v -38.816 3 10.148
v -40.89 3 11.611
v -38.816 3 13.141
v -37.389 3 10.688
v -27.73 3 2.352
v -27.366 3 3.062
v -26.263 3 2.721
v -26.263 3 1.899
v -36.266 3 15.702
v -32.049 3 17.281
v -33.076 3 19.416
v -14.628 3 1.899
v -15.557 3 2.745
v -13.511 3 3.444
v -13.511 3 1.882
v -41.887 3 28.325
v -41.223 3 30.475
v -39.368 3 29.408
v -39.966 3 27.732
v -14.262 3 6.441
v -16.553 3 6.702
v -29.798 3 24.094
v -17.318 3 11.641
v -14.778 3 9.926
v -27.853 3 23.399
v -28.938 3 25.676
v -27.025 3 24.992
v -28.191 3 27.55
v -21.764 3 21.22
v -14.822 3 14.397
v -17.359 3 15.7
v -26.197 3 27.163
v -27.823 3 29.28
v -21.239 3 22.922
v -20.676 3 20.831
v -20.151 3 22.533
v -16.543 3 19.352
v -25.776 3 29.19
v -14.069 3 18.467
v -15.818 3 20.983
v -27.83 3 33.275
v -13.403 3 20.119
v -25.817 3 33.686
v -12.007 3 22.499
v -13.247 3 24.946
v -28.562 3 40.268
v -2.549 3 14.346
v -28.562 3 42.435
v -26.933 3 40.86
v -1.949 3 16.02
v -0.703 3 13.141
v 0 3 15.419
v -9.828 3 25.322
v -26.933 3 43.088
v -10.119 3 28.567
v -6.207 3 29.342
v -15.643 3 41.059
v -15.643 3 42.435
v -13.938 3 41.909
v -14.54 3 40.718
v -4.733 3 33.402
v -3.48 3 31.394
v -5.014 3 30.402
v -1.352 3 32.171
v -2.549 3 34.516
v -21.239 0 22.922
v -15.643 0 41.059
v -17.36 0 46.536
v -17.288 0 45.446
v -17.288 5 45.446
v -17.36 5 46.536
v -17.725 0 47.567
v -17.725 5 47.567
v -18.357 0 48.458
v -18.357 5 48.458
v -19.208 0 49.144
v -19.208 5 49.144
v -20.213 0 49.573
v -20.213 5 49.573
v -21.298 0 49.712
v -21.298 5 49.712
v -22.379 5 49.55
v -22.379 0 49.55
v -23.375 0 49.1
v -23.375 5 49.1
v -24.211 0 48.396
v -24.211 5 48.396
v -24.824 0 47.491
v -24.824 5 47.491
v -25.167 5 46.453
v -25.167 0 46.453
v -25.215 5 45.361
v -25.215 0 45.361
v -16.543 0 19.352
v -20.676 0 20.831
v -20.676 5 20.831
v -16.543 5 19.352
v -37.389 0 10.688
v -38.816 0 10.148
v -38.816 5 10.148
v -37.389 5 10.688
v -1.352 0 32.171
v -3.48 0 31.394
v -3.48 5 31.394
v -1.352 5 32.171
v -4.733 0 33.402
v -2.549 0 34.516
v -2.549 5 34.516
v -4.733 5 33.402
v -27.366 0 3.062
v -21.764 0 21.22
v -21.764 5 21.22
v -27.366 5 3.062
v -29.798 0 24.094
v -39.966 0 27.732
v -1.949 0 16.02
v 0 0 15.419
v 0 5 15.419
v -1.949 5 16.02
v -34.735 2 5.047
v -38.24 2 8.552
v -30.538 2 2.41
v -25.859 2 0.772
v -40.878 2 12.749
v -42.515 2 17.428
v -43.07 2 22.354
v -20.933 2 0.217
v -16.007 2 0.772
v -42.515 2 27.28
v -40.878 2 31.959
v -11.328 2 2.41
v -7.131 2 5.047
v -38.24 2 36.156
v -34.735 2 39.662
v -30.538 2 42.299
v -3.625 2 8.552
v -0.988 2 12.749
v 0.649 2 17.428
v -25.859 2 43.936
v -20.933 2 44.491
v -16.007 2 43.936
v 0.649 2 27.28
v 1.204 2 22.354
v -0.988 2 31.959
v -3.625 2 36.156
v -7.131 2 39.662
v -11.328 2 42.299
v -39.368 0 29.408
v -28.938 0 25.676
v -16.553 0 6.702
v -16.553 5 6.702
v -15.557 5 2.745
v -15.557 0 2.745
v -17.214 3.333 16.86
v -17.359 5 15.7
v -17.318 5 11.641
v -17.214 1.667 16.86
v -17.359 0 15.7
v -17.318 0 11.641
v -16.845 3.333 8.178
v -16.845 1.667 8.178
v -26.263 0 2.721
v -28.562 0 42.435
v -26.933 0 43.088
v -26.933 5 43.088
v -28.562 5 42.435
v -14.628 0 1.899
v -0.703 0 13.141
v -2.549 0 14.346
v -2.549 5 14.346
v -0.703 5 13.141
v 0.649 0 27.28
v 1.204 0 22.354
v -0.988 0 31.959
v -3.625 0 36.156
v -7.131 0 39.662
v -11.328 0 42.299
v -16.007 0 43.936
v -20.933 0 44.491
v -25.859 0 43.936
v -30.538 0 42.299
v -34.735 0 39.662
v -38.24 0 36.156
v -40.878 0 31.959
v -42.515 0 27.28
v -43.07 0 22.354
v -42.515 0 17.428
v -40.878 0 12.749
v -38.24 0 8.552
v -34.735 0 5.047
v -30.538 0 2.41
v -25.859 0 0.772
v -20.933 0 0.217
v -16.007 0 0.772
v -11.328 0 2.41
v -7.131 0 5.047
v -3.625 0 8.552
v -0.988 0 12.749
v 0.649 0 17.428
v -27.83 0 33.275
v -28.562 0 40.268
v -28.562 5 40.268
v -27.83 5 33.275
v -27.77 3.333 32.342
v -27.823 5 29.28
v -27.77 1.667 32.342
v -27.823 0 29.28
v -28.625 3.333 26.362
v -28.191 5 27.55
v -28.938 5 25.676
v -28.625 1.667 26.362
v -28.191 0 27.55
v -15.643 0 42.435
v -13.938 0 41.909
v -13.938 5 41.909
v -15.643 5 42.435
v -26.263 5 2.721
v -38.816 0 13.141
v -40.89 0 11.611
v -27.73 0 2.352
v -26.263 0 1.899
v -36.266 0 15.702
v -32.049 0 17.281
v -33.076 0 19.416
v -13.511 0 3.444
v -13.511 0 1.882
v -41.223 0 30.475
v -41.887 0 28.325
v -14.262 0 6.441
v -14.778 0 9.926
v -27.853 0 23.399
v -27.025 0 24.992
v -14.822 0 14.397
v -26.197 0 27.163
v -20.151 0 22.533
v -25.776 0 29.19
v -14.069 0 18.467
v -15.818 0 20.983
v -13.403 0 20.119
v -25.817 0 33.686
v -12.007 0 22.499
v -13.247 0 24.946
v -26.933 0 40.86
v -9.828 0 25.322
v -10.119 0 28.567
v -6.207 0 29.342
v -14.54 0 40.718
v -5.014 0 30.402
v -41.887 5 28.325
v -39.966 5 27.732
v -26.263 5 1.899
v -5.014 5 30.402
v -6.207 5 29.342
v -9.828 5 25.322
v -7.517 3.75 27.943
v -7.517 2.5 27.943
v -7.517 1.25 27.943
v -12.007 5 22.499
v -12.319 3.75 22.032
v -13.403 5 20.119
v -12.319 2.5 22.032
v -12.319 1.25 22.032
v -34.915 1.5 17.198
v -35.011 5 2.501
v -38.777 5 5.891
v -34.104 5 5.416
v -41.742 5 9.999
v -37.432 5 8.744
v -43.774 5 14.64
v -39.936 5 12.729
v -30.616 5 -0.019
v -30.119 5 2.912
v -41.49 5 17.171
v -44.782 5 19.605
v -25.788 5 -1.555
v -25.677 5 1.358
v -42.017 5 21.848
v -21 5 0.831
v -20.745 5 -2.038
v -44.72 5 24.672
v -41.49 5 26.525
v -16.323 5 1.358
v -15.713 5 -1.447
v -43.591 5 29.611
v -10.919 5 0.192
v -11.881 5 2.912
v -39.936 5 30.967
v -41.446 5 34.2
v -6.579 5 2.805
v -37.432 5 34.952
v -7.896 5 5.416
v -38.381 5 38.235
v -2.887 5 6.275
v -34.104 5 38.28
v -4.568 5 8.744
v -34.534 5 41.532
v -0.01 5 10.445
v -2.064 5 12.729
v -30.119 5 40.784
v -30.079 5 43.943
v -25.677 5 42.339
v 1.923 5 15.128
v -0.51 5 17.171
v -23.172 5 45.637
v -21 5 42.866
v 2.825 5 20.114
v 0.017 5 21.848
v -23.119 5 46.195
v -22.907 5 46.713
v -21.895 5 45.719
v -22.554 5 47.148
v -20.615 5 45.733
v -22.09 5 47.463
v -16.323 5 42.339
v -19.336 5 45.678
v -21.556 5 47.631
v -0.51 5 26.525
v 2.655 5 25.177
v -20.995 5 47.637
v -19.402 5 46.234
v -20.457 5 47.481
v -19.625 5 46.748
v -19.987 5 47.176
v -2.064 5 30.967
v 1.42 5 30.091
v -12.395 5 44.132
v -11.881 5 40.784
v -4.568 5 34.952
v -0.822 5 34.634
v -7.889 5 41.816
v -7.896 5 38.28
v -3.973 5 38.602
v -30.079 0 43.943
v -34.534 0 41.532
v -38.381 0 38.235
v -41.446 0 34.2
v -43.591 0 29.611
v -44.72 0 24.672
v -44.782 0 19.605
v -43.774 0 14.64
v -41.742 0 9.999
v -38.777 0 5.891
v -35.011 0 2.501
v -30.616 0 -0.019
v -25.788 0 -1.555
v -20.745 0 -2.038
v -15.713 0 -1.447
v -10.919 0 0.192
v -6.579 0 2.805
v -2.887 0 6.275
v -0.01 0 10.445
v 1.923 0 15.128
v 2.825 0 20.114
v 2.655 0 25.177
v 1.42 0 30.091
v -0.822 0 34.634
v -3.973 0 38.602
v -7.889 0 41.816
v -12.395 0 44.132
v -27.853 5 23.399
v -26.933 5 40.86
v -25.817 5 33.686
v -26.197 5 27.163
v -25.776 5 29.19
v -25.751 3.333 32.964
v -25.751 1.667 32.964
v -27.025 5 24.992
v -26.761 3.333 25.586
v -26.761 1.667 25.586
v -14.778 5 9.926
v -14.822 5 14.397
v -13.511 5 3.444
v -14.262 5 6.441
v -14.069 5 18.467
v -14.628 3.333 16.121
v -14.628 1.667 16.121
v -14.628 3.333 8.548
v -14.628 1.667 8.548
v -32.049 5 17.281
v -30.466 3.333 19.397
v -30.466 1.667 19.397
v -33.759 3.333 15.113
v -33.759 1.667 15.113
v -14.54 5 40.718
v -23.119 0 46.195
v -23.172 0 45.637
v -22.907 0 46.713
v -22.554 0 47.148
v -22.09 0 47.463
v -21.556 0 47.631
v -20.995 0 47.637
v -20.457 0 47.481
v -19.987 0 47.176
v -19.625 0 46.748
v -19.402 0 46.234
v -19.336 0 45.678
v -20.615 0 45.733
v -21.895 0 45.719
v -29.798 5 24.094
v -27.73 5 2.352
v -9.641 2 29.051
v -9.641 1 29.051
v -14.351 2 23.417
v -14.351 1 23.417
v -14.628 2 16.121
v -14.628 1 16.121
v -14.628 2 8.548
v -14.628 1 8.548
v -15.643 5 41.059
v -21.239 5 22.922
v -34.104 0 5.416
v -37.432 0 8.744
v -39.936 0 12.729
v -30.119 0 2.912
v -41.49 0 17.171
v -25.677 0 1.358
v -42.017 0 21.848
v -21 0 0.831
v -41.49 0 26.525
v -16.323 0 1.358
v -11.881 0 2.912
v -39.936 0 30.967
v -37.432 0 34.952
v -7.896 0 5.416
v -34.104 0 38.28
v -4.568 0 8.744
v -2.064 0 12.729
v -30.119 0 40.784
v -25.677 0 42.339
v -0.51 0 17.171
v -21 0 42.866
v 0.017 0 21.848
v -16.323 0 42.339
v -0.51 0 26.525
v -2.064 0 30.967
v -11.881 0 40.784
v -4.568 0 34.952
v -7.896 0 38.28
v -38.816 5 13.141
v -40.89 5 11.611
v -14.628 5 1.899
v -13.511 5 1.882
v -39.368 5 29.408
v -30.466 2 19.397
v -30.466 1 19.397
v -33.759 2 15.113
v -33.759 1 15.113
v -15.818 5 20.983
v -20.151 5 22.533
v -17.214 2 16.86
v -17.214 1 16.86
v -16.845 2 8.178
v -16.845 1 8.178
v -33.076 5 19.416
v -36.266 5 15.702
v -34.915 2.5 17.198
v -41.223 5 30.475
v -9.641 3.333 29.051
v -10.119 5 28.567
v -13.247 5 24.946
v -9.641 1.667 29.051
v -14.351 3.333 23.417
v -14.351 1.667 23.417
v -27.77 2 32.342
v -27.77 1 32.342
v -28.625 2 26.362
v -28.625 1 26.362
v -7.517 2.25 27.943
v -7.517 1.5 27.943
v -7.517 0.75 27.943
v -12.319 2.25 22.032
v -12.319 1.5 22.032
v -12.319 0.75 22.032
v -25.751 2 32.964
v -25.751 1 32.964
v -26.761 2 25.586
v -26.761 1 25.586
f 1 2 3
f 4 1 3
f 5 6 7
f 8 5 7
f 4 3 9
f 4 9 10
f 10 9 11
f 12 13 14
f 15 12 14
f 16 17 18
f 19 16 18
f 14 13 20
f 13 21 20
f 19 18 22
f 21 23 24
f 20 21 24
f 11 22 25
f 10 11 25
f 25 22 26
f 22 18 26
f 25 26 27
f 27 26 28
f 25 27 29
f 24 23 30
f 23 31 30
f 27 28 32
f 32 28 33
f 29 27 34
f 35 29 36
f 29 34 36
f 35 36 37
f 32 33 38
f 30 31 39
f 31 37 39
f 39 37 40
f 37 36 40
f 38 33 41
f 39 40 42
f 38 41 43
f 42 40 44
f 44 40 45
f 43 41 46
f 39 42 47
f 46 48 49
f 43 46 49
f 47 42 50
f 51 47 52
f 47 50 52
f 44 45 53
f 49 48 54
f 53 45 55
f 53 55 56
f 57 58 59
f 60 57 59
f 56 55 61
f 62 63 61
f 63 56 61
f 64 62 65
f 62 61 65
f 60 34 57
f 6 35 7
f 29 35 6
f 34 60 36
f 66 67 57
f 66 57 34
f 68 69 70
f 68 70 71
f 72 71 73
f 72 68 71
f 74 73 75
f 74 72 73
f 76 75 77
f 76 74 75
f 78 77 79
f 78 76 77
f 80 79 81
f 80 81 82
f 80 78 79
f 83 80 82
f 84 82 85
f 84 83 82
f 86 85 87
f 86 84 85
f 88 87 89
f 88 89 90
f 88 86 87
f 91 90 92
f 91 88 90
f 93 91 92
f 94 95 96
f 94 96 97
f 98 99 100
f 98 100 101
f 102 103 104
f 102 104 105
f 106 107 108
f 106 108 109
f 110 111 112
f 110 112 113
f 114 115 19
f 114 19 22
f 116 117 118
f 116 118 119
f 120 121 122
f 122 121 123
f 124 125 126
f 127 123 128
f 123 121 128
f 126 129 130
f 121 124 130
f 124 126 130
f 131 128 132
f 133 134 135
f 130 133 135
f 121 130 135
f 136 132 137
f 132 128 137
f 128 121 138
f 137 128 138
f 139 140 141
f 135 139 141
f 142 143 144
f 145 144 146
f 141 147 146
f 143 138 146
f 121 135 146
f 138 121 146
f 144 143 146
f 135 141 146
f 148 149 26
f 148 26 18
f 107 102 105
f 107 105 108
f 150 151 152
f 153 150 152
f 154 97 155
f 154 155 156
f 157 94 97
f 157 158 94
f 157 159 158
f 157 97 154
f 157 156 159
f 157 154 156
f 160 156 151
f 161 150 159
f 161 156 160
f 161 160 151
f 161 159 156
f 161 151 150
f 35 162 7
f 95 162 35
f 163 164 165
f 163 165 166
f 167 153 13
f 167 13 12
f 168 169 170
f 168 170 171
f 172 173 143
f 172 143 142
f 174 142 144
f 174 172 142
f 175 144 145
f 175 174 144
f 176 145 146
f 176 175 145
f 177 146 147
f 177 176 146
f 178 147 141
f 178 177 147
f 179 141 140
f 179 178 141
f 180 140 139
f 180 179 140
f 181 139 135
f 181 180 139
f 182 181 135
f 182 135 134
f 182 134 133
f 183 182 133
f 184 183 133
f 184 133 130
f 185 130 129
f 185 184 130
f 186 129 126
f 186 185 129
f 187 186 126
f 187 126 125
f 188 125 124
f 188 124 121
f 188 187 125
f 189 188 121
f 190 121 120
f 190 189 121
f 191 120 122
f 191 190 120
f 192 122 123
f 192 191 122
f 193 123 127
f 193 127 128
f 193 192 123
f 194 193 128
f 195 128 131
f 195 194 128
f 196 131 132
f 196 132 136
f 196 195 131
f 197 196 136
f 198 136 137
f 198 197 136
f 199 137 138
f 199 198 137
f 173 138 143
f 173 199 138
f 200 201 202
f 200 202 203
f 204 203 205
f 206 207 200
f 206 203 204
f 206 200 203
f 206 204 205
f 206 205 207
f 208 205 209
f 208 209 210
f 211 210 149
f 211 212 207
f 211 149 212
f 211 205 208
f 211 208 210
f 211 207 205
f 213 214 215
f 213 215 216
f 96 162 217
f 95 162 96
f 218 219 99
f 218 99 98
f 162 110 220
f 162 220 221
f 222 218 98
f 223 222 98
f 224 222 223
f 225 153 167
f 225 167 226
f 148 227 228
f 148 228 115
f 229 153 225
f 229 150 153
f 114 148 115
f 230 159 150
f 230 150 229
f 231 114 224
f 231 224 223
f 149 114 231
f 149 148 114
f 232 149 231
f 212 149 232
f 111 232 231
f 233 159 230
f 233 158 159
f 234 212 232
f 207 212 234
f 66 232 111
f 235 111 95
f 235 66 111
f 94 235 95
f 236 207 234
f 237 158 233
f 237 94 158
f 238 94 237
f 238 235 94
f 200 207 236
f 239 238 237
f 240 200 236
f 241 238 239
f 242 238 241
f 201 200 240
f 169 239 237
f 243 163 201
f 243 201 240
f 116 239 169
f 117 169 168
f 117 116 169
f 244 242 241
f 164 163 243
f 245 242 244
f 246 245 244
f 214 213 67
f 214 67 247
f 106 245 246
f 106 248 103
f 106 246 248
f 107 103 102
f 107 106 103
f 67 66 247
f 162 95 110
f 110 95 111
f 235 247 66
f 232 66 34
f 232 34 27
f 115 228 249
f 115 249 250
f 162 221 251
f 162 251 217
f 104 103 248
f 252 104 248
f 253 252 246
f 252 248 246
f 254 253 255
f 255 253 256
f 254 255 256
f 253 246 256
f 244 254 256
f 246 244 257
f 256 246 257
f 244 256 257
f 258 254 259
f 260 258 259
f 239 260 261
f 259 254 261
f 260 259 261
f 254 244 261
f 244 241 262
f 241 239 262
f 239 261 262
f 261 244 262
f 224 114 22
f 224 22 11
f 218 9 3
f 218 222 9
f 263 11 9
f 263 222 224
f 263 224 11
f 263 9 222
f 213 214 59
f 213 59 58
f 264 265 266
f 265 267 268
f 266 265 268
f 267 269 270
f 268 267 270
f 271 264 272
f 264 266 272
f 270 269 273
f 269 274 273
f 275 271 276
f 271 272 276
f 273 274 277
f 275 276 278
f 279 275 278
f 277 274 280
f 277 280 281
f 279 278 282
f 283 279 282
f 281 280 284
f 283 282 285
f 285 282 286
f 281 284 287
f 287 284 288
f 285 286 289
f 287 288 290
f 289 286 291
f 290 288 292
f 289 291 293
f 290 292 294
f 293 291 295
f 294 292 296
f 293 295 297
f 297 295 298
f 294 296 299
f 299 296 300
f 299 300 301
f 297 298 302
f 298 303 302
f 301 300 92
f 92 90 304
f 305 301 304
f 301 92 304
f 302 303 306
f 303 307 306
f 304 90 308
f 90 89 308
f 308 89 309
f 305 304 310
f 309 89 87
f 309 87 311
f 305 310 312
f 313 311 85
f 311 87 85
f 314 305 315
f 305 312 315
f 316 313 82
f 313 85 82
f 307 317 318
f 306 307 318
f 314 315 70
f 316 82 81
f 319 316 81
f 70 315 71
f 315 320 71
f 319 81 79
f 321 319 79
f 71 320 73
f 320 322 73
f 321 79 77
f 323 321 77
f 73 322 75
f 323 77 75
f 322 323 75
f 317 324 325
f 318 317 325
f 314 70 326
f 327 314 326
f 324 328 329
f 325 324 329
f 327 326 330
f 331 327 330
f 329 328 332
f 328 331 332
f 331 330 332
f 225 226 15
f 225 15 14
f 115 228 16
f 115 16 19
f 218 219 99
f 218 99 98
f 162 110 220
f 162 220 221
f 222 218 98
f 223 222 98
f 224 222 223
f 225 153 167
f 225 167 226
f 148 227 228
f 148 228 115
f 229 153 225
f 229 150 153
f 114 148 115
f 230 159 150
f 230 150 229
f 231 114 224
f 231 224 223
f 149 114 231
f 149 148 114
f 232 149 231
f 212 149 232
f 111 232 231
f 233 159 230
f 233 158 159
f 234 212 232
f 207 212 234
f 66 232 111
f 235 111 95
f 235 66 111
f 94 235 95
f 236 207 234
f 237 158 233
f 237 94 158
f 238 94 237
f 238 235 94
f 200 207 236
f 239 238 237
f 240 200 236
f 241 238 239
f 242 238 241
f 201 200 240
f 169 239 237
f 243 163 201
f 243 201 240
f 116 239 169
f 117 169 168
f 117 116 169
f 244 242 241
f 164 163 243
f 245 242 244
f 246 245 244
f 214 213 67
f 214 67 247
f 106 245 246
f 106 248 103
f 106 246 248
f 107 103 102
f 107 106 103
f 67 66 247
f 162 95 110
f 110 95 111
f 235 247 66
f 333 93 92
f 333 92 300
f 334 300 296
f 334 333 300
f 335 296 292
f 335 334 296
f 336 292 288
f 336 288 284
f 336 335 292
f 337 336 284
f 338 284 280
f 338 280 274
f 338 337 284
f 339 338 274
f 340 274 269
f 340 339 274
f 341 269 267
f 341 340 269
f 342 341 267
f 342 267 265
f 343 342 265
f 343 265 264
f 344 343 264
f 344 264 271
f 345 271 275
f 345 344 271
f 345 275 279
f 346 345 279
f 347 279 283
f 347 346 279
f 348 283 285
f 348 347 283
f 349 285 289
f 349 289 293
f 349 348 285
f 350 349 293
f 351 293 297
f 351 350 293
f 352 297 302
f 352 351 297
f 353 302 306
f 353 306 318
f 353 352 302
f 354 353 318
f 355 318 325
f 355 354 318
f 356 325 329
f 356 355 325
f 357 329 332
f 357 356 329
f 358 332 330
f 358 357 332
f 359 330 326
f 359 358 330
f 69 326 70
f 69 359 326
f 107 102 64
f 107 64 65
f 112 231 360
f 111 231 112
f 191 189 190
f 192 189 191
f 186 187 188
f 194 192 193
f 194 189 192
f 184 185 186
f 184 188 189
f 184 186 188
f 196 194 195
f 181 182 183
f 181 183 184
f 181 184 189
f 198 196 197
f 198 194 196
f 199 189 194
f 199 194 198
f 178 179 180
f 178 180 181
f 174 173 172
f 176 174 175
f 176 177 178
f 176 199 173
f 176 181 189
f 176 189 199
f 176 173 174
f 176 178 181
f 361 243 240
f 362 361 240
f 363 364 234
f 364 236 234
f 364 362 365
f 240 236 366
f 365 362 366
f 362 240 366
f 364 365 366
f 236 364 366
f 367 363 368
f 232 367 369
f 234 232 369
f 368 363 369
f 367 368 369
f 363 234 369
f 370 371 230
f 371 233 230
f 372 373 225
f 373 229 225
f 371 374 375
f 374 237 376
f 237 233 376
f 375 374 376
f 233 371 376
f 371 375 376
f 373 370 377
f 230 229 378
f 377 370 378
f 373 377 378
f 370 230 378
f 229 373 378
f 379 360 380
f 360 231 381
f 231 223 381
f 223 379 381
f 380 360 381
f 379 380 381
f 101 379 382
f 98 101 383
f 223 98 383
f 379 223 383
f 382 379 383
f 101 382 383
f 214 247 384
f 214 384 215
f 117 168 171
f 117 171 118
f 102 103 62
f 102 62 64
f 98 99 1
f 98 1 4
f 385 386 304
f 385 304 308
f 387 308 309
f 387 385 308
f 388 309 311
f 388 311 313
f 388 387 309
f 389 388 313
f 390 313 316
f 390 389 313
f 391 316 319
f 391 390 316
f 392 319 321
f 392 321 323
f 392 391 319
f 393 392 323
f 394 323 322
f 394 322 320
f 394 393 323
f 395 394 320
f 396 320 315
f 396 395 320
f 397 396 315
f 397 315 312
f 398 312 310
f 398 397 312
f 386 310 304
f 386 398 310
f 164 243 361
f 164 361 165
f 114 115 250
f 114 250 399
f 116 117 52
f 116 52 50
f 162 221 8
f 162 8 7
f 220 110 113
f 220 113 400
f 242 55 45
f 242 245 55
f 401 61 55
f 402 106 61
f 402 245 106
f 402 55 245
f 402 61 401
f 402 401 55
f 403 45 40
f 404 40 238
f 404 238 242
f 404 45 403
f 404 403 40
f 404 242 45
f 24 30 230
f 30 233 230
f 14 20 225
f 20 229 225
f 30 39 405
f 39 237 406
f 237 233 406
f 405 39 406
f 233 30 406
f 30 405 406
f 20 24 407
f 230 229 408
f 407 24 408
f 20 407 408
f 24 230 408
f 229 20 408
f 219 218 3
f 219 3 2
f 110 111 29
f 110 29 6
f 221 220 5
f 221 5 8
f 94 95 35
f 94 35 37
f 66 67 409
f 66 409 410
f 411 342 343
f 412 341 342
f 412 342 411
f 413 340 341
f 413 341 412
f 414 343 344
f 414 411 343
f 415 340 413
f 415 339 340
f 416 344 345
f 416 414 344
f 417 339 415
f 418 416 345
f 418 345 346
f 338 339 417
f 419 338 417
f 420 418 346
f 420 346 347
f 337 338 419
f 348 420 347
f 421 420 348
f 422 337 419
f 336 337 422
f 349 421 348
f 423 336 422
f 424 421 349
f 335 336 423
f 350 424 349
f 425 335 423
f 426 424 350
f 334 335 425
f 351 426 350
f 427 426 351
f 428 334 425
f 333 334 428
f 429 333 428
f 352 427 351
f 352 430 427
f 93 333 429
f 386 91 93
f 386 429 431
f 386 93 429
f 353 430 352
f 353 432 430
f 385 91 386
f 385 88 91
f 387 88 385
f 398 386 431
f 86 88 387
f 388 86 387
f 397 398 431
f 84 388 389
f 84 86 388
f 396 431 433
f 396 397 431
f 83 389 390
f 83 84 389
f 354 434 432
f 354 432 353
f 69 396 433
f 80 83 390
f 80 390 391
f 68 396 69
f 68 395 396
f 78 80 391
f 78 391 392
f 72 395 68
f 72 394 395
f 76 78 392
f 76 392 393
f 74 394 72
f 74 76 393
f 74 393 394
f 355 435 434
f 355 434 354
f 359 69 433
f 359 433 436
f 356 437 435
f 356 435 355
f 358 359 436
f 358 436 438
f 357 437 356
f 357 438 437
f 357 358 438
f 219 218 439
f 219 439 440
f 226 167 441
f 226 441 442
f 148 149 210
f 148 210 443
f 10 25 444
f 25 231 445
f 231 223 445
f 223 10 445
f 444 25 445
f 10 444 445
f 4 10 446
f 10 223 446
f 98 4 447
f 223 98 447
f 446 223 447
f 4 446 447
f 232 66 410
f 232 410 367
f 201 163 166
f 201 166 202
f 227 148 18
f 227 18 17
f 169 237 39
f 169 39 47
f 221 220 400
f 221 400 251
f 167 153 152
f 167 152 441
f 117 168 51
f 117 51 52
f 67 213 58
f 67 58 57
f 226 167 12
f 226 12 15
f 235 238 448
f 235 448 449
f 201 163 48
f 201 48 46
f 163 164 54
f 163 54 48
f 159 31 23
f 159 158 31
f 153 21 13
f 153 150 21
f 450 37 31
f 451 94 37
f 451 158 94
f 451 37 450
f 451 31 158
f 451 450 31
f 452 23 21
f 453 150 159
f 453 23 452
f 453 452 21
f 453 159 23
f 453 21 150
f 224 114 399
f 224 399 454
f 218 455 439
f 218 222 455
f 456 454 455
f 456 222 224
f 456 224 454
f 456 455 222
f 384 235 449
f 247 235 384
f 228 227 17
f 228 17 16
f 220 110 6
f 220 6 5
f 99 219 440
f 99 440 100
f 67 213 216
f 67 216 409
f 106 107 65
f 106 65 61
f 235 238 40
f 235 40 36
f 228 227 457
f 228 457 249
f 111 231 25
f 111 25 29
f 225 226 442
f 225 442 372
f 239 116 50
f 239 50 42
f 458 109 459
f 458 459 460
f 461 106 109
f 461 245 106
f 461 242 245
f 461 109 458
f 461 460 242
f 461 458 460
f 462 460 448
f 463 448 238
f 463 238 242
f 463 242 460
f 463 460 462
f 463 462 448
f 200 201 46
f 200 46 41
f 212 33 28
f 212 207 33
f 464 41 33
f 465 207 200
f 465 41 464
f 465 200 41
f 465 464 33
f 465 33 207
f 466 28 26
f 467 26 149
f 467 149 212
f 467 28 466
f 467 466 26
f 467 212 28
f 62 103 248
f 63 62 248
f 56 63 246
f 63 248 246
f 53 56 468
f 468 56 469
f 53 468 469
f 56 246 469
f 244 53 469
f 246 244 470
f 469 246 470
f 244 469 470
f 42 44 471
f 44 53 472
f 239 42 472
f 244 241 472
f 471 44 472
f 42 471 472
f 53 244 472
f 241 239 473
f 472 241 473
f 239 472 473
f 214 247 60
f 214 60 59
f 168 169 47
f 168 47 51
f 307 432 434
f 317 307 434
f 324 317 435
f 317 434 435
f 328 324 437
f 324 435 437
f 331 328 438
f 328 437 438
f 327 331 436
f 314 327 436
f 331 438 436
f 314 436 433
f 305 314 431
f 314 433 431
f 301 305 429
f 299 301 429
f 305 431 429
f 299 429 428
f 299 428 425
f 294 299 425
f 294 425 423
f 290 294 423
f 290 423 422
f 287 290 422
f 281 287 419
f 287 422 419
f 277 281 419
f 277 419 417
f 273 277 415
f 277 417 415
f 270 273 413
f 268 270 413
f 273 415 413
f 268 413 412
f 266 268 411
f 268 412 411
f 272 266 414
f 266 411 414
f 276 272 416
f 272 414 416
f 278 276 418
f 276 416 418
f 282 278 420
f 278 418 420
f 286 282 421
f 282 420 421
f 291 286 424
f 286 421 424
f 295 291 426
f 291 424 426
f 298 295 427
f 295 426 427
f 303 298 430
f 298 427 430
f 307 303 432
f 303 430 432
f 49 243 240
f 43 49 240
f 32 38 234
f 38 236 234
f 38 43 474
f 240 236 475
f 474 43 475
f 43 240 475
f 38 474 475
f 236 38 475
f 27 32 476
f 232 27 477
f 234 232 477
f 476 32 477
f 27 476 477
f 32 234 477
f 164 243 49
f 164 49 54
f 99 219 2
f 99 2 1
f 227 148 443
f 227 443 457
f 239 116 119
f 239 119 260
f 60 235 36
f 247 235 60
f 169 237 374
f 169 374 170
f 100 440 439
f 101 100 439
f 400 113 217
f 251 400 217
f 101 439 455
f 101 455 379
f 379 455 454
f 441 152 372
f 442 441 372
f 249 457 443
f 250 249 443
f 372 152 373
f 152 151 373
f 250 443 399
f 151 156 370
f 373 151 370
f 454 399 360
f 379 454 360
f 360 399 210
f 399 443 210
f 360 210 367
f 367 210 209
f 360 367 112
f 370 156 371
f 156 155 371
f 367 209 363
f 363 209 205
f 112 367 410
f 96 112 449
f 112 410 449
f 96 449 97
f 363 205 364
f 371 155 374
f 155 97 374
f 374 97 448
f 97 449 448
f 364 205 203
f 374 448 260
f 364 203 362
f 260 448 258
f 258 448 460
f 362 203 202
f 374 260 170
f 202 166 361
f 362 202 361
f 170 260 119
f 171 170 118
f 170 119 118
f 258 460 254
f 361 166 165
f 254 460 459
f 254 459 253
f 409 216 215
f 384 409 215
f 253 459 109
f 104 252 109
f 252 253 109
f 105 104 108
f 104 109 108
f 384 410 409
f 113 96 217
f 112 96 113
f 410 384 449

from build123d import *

# Parameters (mm, degrees)
F0_R     = 21.0173694248
F2_DEPTH = 5
F3_DEPTH = 3
F4_R     = 22.1369694457
F5_DEPTH = 2


with BuildPart() as f2:
    # F0 (on Front) → F2 (new body)
    with BuildSketch(Plane.XZ):
        with BuildLine():
            ThreePointArc((-25.2147613693, 45.3611427927), (-20.7448855599, -2.0381687537), (-17.2883954881, 45.4457990798))
            ThreePointArc((-17.2883954881, 45.4457990798), (-21.2975900226, 49.7115352336), (-25.2147613693, 45.3611427927))
        make_face()
        with Locations((-21, 21.848189415)):
            Circle(F0_R, mode=Mode.SUBTRACT)
        with BuildLine():
            ThreePointArc((-23.1723608778, 45.6369270477), (-21.2756166421, 47.6541682056), (-19.3362203485, 45.677898335))
            ThreePointArc((-19.3362203485, 45.677898335), (-21.2551144401, 45.7345475837), (-23.1723608778, 45.6369270477))
        make_face(mode=Mode.SUBTRACT)
    extrude(amount=-F2_DEPTH)


with BuildPart() as f2b:
    # F1 (on face) → F2, piece 2 (new body)
    with BuildSketch(Plane.XZ):
        with BuildLine():
            Line((-15.6434053378, 42.4352623522), (-15.6434053378, 41.0586307483))
            Line((-15.6434053378, 41.0586307483), (-21.2389320528, 22.9218076049))
            Line((-21.2389320528, 22.9218076049), (-27.0251246129, 24.9918799515))
            add(Edge.make_bspline(
                [(-27.0251246129, 24.9918799515), (-27.2667200019, 24.4750783506), (-27.5440850694, 23.9433288862), (-27.8527339783, 23.398512914)],
                knots=[0.5850241897, 0.5850241897, 0.5850241897, 0.5850241897, 0.6369170232, 0.6369170232, 0.6369170232, 0.6369170232], degree=3))
            Line((-27.8527339783, 23.398512914), (-21.7639160209, 21.220173091))
            Line((-21.7639160209, 21.220173091), (-27.3661202396, 3.0617061044))
            Line((-27.3661202396, 3.0617061044), (-27.7301800651, 2.3515297653))
            Line((-27.7301800651, 2.3515297653), (-26.2630893095, 1.8989066432))
            Line((-26.2630893095, 1.8989066432), (-26.2630893095, 2.7214017971))
            Line((-26.2630893095, 2.7214017971), (-20.675977002, 20.8309512574))
            Line((-20.675977002, 20.8309512574), (-16.5428058438, 19.3522650178))
            add(Edge.make_bspline(
                [(-15.8184717487, 20.9825798891), (-16.0888028731, 20.4550204602), (-16.3323949207, 19.9134852447), (-16.5428058438, 19.3522650178)],
                knots=[0.4780011516, 0.4780011516, 0.4780011516, 0.4780011516, 0.5285364589, 0.5285364589, 0.5285364589, 0.5285364589], degree=3))
            Line((-15.8184717487, 20.9825798891), (-20.150993034, 22.5325857713))
            Line((-20.150993034, 22.5325857713), (-14.5403744077, 40.7183264409))
            Line((-14.5403744077, 40.7183264409), (-13.9376726897, 41.9090140382))
            Line((-13.9376726897, 41.9090140382), (-15.6434053378, 42.4352623522))
        make_face()
        with BuildLine():
            add(Edge.make_bspline(
                [(-27.0251246129, 24.9918799515), (-27.2667200019, 24.4750783506), (-27.5440850694, 23.9433288862), (-27.8527339783, 23.398512914)],
                knots=[0.5850241897, 0.5850241897, 0.5850241897, 0.5850241897, 0.6369170232, 0.6369170232, 0.6369170232, 0.6369170232], degree=3))
            add(Edge.make_bspline(
                [(-26.9327240246, 40.8604158787), (-26.4461932855, 38.1720542595), (-25.4831391669, 32.8703496623), (-25.6253116841, 28.1230420347), (-26.9315363662, 25.1920764699), (-27.0251246129, 24.9918799515)],
                knots=[0, 0, 0, 0, 0.2873866411, 0.5649221532, 0.5850241897, 0.5850241897, 0.5850241897, 0.5850241897], degree=3))
            Line((-26.9327240246, 40.8604158787), (-26.9327240246, 43.088324368))
            Line((-26.9327240246, 43.088324368), (-28.561863665, 42.4352623522))
            Line((-28.561863665, 42.4352623522), (-28.561863665, 40.267697307))
            add(Edge.make_bspline(
                [(-28.561863665, 40.267697307), (-28.2332233479, 37.4932257691), (-27.6084806879, 32.2857996771), (-27.7056505928, 28.3536086922), (-28.8248751971, 25.9088704148), (-28.93806897, 25.676256279)],
                knots=[0, 0, 0, 0, 0.2568823312, 0.4805952008, 0.5037124373, 0.5037124373, 0.5037124373, 0.5037124373], degree=3))
            add(Edge.make_bspline(
                [(-28.93806897, 25.676256279), (-29.1875918662, 25.1634846718), (-29.4777928646, 24.6329834512), (-29.7976547361, 24.0943291412)],
                knots=[0.5037124373, 0.5037124373, 0.5037124373, 0.5037124373, 0.5546717761, 0.5546717761, 0.5546717761, 0.5546717761], degree=3))
            add(Edge.make_bspline(
                [(-29.7976547361, 24.0943291412), (-31.2374923714, 21.6696114203), (-35.1995176822, 16.6416461958), (-37.6393346001, 14.2831347624), (-38.816240489, 13.1410918814)],
                knots=[0.5546717761, 0.5546717761, 0.5546717761, 0.5546717761, 0.7840619611, 1, 1, 1, 1], degree=3))
            Line((-38.816240489, 13.1410918814), (-40.8904254436, 11.6106858477))
            Line((-40.8904254436, 11.6106858477), (-38.816240489, 10.1480129416))
            Line((-38.816240489, 10.1480129416), (-37.3893617116, 10.6880366863))
            add(Edge.make_bspline(
                [(-27.8527339783, 23.398512914), (-30.0122838985, 19.5865529315), (-33.7033340895, 15.1349221345), (-37.3893617116, 10.6880366863)],
                knots=[0.6369170232, 0.6369170232, 0.6369170232, 0.6369170232, 1, 1, 1, 1], degree=3))
        make_face()
        with BuildLine():
            add(Edge.make_bspline(
                [(-4.7326299883, 33.4018265599), (-6.3838063491, 32.0250727471), (-9.7867688662, 29.1885817162), (-13.6252095004, 24.6696939229), (-15.3884484127, 21.8217835363), (-15.8184717487, 20.9825798891)],
                knots=[0, 0, 0, 0, 0.1931958421, 0.3976132144, 0.4780011516, 0.4780011516, 0.4780011516, 0.4780011516], degree=3))
            add(Edge.make_bspline(
                [(-15.8184717487, 20.9825798891), (-16.0888028731, 20.4550204602), (-16.3323949207, 19.9134852447), (-16.5428058438, 19.3522650178)],
                knots=[0.4780011516, 0.4780011516, 0.4780011516, 0.4780011516, 0.5285364589, 0.5285364589, 0.5285364589, 0.5285364589], degree=3))
            add(Edge.make_bspline(
                [(-16.5428058438, 19.3522650178), (-16.8378280623, 18.5653646327), (-17.7887482068, 15.1488505296), (-17.0326071228, 8.1565953069), (-16.0108322366, 4.4090669931), (-15.5574461885, 2.745420875)],
                knots=[0.5285364589, 0.5285364589, 0.5285364589, 0.5285364589, 0.5993932294, 0.8217572748, 1, 1, 1, 1], degree=3))
            Line((-15.5574461885, 2.745420875), (-14.6284196526, 1.8989066432))
            Line((-14.6284196526, 1.8989066432), (-13.510598544, 1.8815415679))
            Line((-13.510598544, 1.8815415679), (-13.510598544, 3.4444969801))
            add(Edge.make_bspline(
                [(-14.069044194, 18.4672502987), (-14.3144930834, 17.7220644749), (-15.0270887125, 14.7189198371), (-14.8879048078, 8.5169626468), (-13.9376726897, 5.0225594813), (-13.510598544, 3.4444969801)],
                knots=[0.5582363622, 0.5582363622, 0.5582363622, 0.5582363622, 0.6285679089, 0.8314758152, 1, 1, 1, 1], degree=3))
            add(Edge.make_bspline(
                [(-13.4034524292, 20.1185808677), (-13.6632532189, 19.5761416352), (-13.8838117808, 19.029618166), (-14.069044194, 18.4672502987)],
                knots=[0.5051593971, 0.5051593971, 0.5051593971, 0.5051593971, 0.5582363622, 0.5582363622, 0.5582363622, 0.5582363622], degree=3))
            add(Edge.make_bspline(
                [(-3.4803220268, 31.3940724804), (-4.0596052372, 31.048753856), (-5.3792648724, 30.2642054545), (-7.6161489545, 27.8563879413), (-11.5665036402, 23.4480832146), (-13.0983628201, 20.7555788294), (-13.4034524292, 20.1185808677)],
                knots=[0, 0, 0, 0, 0.1061157447, 0.2393511298, 0.4428299848, 0.5051593971, 0.5051593971, 0.5051593971, 0.5051593971], degree=3))
            Line((-3.4803220268, 31.3940724804), (-1.3515079001, 32.1705370468))
            Line((-1.3515079001, 32.1705370468), (-2.5490200479, 34.5164759679))
            Line((-2.5490200479, 34.5164759679), (-4.7326299883, 33.4018265599))
        make_face()
        with BuildLine():
            add(Edge.make_bspline(
                [(-28.93806897, 25.676256279), (-29.1875918662, 25.1634846718), (-29.4777928646, 24.6329834512), (-29.7976547361, 24.0943291412)],
                knots=[0.5037124373, 0.5037124373, 0.5037124373, 0.5037124373, 0.5546717761, 0.5546717761, 0.5546717761, 0.5546717761], degree=3))
            Line((-28.93806897, 25.676256279), (-39.3682815074, 29.4077765003))
            Line((-39.3682815074, 29.4077765003), (-41.2232555875, 30.4750070098))
            Line((-41.2232555875, 30.4750070098), (-41.886651929, 28.3247354211))
            Line((-41.886651929, 28.3247354211), (-39.9663495654, 27.7322886022))
            Line((-39.9663495654, 27.7322886022), (-29.7976547361, 24.0943291412))
        make_face()
        with BuildLine():
            Line((-1.948548289, 16.0204662531), (-13.4034524292, 20.1185808677))
            add(Edge.make_bspline(
                [(-13.4034524292, 20.1185808677), (-13.6632532189, 19.5761416352), (-13.8838117808, 19.029618166), (-14.069044194, 18.4672502987)],
                knots=[0.5051593971, 0.5051593971, 0.5051593971, 0.5051593971, 0.5582363622, 0.5582363622, 0.5582363622, 0.5582363622], degree=3))
            Line((-14.069044194, 18.4672502987), (-2.5490200479, 14.3458383047))
            Line((-2.5490200479, 14.3458383047), (-0.7028685605, 13.1410918814))
            Line((-0.7028685605, 13.1410918814), (0, 15.4193050729))
            Line((0, 15.4193050729), (-1.948548289, 16.0204662531))
        make_face()
    extrude(amount=-F2_DEPTH)


with BuildPart() as f3:
    # F1 (on face) → F3 (new body)
    with BuildSketch(Plane.XZ):
        with BuildLine():
            Line((-15.6434053378, 42.4352623522), (-15.6434053378, 41.0586307483))
            Line((-15.6434053378, 41.0586307483), (-21.2389320528, 22.9218076049))
            Line((-21.2389320528, 22.9218076049), (-27.0251246129, 24.9918799515))
            add(Edge.make_bspline(
                [(-27.0251246129, 24.9918799515), (-27.2667200019, 24.4750783506), (-27.5440850694, 23.9433288862), (-27.8527339783, 23.398512914)],
                knots=[0.5850241897, 0.5850241897, 0.5850241897, 0.5850241897, 0.6369170232, 0.6369170232, 0.6369170232, 0.6369170232], degree=3))
            Line((-27.8527339783, 23.398512914), (-21.7639160209, 21.220173091))
            Line((-21.7639160209, 21.220173091), (-27.3661202396, 3.0617061044))
            Line((-27.3661202396, 3.0617061044), (-27.7301800651, 2.3515297653))
            Line((-27.7301800651, 2.3515297653), (-26.2630893095, 1.8989066432))
            Line((-26.2630893095, 1.8989066432), (-26.2630893095, 2.7214017971))
            Line((-26.2630893095, 2.7214017971), (-20.675977002, 20.8309512574))
            Line((-20.675977002, 20.8309512574), (-16.5428058438, 19.3522650178))
            add(Edge.make_bspline(
                [(-15.8184717487, 20.9825798891), (-16.0888028731, 20.4550204602), (-16.3323949207, 19.9134852447), (-16.5428058438, 19.3522650178)],
                knots=[0.4780011516, 0.4780011516, 0.4780011516, 0.4780011516, 0.5285364589, 0.5285364589, 0.5285364589, 0.5285364589], degree=3))
            Line((-15.8184717487, 20.9825798891), (-20.150993034, 22.5325857713))
            Line((-20.150993034, 22.5325857713), (-14.5403744077, 40.7183264409))
            Line((-14.5403744077, 40.7183264409), (-13.9376726897, 41.9090140382))
            Line((-13.9376726897, 41.9090140382), (-15.6434053378, 42.4352623522))
        make_face()
        with BuildLine():
            add(Edge.make_bspline(
                [(-27.0251246129, 24.9918799515), (-27.2667200019, 24.4750783506), (-27.5440850694, 23.9433288862), (-27.8527339783, 23.398512914)],
                knots=[0.5850241897, 0.5850241897, 0.5850241897, 0.5850241897, 0.6369170232, 0.6369170232, 0.6369170232, 0.6369170232], degree=3))
            add(Edge.make_bspline(
                [(-26.9327240246, 40.8604158787), (-26.4461932855, 38.1720542595), (-25.4831391669, 32.8703496623), (-25.6253116841, 28.1230420347), (-26.9315363662, 25.1920764699), (-27.0251246129, 24.9918799515)],
                knots=[0, 0, 0, 0, 0.2873866411, 0.5649221532, 0.5850241897, 0.5850241897, 0.5850241897, 0.5850241897], degree=3))
            Line((-26.9327240246, 40.8604158787), (-26.9327240246, 43.088324368))
            Line((-26.9327240246, 43.088324368), (-28.561863665, 42.4352623522))
            Line((-28.561863665, 42.4352623522), (-28.561863665, 40.267697307))
            add(Edge.make_bspline(
                [(-28.561863665, 40.267697307), (-28.2332233479, 37.4932257691), (-27.6084806879, 32.2857996771), (-27.7056505928, 28.3536086922), (-28.8248751971, 25.9088704148), (-28.93806897, 25.676256279)],
                knots=[0, 0, 0, 0, 0.2568823312, 0.4805952008, 0.5037124373, 0.5037124373, 0.5037124373, 0.5037124373], degree=3))
            add(Edge.make_bspline(
                [(-28.93806897, 25.676256279), (-29.1875918662, 25.1634846718), (-29.4777928646, 24.6329834512), (-29.7976547361, 24.0943291412)],
                knots=[0.5037124373, 0.5037124373, 0.5037124373, 0.5037124373, 0.5546717761, 0.5546717761, 0.5546717761, 0.5546717761], degree=3))
            add(Edge.make_bspline(
                [(-29.7976547361, 24.0943291412), (-31.2374923714, 21.6696114203), (-35.1995176822, 16.6416461958), (-37.6393346001, 14.2831347624), (-38.816240489, 13.1410918814)],
                knots=[0.5546717761, 0.5546717761, 0.5546717761, 0.5546717761, 0.7840619611, 1, 1, 1, 1], degree=3))
            Line((-38.816240489, 13.1410918814), (-40.8904254436, 11.6106858477))
            Line((-40.8904254436, 11.6106858477), (-38.816240489, 10.1480129416))
            Line((-38.816240489, 10.1480129416), (-37.3893617116, 10.6880366863))
            add(Edge.make_bspline(
                [(-27.8527339783, 23.398512914), (-30.0122838985, 19.5865529315), (-33.7033340895, 15.1349221345), (-37.3893617116, 10.6880366863)],
                knots=[0.6369170232, 0.6369170232, 0.6369170232, 0.6369170232, 1, 1, 1, 1], degree=3))
        make_face()
        with BuildLine():
            add(Edge.make_bspline(
                [(-4.7326299883, 33.4018265599), (-6.3838063491, 32.0250727471), (-9.7867688662, 29.1885817162), (-13.6252095004, 24.6696939229), (-15.3884484127, 21.8217835363), (-15.8184717487, 20.9825798891)],
                knots=[0, 0, 0, 0, 0.1931958421, 0.3976132144, 0.4780011516, 0.4780011516, 0.4780011516, 0.4780011516], degree=3))
            add(Edge.make_bspline(
                [(-15.8184717487, 20.9825798891), (-16.0888028731, 20.4550204602), (-16.3323949207, 19.9134852447), (-16.5428058438, 19.3522650178)],
                knots=[0.4780011516, 0.4780011516, 0.4780011516, 0.4780011516, 0.5285364589, 0.5285364589, 0.5285364589, 0.5285364589], degree=3))
            add(Edge.make_bspline(
                [(-16.5428058438, 19.3522650178), (-16.8378280623, 18.5653646327), (-17.7887482068, 15.1488505296), (-17.0326071228, 8.1565953069), (-16.0108322366, 4.4090669931), (-15.5574461885, 2.745420875)],
                knots=[0.5285364589, 0.5285364589, 0.5285364589, 0.5285364589, 0.5993932294, 0.8217572748, 1, 1, 1, 1], degree=3))
            Line((-15.5574461885, 2.745420875), (-14.6284196526, 1.8989066432))
            Line((-14.6284196526, 1.8989066432), (-13.510598544, 1.8815415679))
            Line((-13.510598544, 1.8815415679), (-13.510598544, 3.4444969801))
            add(Edge.make_bspline(
                [(-14.069044194, 18.4672502987), (-14.3144930834, 17.7220644749), (-15.0270887125, 14.7189198371), (-14.8879048078, 8.5169626468), (-13.9376726897, 5.0225594813), (-13.510598544, 3.4444969801)],
                knots=[0.5582363622, 0.5582363622, 0.5582363622, 0.5582363622, 0.6285679089, 0.8314758152, 1, 1, 1, 1], degree=3))
            add(Edge.make_bspline(
                [(-13.4034524292, 20.1185808677), (-13.6632532189, 19.5761416352), (-13.8838117808, 19.029618166), (-14.069044194, 18.4672502987)],
                knots=[0.5051593971, 0.5051593971, 0.5051593971, 0.5051593971, 0.5582363622, 0.5582363622, 0.5582363622, 0.5582363622], degree=3))
            add(Edge.make_bspline(
                [(-3.4803220268, 31.3940724804), (-4.0596052372, 31.048753856), (-5.3792648724, 30.2642054545), (-7.6161489545, 27.8563879413), (-11.5665036402, 23.4480832146), (-13.0983628201, 20.7555788294), (-13.4034524292, 20.1185808677)],
                knots=[0, 0, 0, 0, 0.1061157447, 0.2393511298, 0.4428299848, 0.5051593971, 0.5051593971, 0.5051593971, 0.5051593971], degree=3))
            Line((-3.4803220268, 31.3940724804), (-1.3515079001, 32.1705370468))
            Line((-1.3515079001, 32.1705370468), (-2.5490200479, 34.5164759679))
            Line((-2.5490200479, 34.5164759679), (-4.7326299883, 33.4018265599))
        make_face()
        with BuildLine():
            add(Edge.make_bspline(
                [(-28.93806897, 25.676256279), (-29.1875918662, 25.1634846718), (-29.4777928646, 24.6329834512), (-29.7976547361, 24.0943291412)],
                knots=[0.5037124373, 0.5037124373, 0.5037124373, 0.5037124373, 0.5546717761, 0.5546717761, 0.5546717761, 0.5546717761], degree=3))
            Line((-28.93806897, 25.676256279), (-39.3682815074, 29.4077765003))
            Line((-39.3682815074, 29.4077765003), (-41.2232555875, 30.4750070098))
            Line((-41.2232555875, 30.4750070098), (-41.886651929, 28.3247354211))
            Line((-41.886651929, 28.3247354211), (-39.9663495654, 27.7322886022))
            Line((-39.9663495654, 27.7322886022), (-29.7976547361, 24.0943291412))
        make_face()
        with BuildLine():
            Line((-1.948548289, 16.0204662531), (-13.4034524292, 20.1185808677))
            add(Edge.make_bspline(
                [(-13.4034524292, 20.1185808677), (-13.6632532189, 19.5761416352), (-13.8838117808, 19.029618166), (-14.069044194, 18.4672502987)],
                knots=[0.5051593971, 0.5051593971, 0.5051593971, 0.5051593971, 0.5582363622, 0.5582363622, 0.5582363622, 0.5582363622], degree=3))
            Line((-14.069044194, 18.4672502987), (-2.5490200479, 14.3458383047))
            Line((-2.5490200479, 14.3458383047), (-0.7028685605, 13.1410918814))
            Line((-0.7028685605, 13.1410918814), (0, 15.4193050729))
            Line((0, 15.4193050729), (-1.948548289, 16.0204662531))
        make_face()
    extrude(amount=-F3_DEPTH)


with BuildPart() as f5:
    # F4 (on Front) → F5 (new body)
    with BuildSketch(Plane.XZ):
        with Locations((-20.9328643978, 22.3543141037)):
            Circle(F4_R)
    extrude(amount=-F5_DEPTH)


solid = Compound([f2.part, f2b.part, f3.part, f5.part])
